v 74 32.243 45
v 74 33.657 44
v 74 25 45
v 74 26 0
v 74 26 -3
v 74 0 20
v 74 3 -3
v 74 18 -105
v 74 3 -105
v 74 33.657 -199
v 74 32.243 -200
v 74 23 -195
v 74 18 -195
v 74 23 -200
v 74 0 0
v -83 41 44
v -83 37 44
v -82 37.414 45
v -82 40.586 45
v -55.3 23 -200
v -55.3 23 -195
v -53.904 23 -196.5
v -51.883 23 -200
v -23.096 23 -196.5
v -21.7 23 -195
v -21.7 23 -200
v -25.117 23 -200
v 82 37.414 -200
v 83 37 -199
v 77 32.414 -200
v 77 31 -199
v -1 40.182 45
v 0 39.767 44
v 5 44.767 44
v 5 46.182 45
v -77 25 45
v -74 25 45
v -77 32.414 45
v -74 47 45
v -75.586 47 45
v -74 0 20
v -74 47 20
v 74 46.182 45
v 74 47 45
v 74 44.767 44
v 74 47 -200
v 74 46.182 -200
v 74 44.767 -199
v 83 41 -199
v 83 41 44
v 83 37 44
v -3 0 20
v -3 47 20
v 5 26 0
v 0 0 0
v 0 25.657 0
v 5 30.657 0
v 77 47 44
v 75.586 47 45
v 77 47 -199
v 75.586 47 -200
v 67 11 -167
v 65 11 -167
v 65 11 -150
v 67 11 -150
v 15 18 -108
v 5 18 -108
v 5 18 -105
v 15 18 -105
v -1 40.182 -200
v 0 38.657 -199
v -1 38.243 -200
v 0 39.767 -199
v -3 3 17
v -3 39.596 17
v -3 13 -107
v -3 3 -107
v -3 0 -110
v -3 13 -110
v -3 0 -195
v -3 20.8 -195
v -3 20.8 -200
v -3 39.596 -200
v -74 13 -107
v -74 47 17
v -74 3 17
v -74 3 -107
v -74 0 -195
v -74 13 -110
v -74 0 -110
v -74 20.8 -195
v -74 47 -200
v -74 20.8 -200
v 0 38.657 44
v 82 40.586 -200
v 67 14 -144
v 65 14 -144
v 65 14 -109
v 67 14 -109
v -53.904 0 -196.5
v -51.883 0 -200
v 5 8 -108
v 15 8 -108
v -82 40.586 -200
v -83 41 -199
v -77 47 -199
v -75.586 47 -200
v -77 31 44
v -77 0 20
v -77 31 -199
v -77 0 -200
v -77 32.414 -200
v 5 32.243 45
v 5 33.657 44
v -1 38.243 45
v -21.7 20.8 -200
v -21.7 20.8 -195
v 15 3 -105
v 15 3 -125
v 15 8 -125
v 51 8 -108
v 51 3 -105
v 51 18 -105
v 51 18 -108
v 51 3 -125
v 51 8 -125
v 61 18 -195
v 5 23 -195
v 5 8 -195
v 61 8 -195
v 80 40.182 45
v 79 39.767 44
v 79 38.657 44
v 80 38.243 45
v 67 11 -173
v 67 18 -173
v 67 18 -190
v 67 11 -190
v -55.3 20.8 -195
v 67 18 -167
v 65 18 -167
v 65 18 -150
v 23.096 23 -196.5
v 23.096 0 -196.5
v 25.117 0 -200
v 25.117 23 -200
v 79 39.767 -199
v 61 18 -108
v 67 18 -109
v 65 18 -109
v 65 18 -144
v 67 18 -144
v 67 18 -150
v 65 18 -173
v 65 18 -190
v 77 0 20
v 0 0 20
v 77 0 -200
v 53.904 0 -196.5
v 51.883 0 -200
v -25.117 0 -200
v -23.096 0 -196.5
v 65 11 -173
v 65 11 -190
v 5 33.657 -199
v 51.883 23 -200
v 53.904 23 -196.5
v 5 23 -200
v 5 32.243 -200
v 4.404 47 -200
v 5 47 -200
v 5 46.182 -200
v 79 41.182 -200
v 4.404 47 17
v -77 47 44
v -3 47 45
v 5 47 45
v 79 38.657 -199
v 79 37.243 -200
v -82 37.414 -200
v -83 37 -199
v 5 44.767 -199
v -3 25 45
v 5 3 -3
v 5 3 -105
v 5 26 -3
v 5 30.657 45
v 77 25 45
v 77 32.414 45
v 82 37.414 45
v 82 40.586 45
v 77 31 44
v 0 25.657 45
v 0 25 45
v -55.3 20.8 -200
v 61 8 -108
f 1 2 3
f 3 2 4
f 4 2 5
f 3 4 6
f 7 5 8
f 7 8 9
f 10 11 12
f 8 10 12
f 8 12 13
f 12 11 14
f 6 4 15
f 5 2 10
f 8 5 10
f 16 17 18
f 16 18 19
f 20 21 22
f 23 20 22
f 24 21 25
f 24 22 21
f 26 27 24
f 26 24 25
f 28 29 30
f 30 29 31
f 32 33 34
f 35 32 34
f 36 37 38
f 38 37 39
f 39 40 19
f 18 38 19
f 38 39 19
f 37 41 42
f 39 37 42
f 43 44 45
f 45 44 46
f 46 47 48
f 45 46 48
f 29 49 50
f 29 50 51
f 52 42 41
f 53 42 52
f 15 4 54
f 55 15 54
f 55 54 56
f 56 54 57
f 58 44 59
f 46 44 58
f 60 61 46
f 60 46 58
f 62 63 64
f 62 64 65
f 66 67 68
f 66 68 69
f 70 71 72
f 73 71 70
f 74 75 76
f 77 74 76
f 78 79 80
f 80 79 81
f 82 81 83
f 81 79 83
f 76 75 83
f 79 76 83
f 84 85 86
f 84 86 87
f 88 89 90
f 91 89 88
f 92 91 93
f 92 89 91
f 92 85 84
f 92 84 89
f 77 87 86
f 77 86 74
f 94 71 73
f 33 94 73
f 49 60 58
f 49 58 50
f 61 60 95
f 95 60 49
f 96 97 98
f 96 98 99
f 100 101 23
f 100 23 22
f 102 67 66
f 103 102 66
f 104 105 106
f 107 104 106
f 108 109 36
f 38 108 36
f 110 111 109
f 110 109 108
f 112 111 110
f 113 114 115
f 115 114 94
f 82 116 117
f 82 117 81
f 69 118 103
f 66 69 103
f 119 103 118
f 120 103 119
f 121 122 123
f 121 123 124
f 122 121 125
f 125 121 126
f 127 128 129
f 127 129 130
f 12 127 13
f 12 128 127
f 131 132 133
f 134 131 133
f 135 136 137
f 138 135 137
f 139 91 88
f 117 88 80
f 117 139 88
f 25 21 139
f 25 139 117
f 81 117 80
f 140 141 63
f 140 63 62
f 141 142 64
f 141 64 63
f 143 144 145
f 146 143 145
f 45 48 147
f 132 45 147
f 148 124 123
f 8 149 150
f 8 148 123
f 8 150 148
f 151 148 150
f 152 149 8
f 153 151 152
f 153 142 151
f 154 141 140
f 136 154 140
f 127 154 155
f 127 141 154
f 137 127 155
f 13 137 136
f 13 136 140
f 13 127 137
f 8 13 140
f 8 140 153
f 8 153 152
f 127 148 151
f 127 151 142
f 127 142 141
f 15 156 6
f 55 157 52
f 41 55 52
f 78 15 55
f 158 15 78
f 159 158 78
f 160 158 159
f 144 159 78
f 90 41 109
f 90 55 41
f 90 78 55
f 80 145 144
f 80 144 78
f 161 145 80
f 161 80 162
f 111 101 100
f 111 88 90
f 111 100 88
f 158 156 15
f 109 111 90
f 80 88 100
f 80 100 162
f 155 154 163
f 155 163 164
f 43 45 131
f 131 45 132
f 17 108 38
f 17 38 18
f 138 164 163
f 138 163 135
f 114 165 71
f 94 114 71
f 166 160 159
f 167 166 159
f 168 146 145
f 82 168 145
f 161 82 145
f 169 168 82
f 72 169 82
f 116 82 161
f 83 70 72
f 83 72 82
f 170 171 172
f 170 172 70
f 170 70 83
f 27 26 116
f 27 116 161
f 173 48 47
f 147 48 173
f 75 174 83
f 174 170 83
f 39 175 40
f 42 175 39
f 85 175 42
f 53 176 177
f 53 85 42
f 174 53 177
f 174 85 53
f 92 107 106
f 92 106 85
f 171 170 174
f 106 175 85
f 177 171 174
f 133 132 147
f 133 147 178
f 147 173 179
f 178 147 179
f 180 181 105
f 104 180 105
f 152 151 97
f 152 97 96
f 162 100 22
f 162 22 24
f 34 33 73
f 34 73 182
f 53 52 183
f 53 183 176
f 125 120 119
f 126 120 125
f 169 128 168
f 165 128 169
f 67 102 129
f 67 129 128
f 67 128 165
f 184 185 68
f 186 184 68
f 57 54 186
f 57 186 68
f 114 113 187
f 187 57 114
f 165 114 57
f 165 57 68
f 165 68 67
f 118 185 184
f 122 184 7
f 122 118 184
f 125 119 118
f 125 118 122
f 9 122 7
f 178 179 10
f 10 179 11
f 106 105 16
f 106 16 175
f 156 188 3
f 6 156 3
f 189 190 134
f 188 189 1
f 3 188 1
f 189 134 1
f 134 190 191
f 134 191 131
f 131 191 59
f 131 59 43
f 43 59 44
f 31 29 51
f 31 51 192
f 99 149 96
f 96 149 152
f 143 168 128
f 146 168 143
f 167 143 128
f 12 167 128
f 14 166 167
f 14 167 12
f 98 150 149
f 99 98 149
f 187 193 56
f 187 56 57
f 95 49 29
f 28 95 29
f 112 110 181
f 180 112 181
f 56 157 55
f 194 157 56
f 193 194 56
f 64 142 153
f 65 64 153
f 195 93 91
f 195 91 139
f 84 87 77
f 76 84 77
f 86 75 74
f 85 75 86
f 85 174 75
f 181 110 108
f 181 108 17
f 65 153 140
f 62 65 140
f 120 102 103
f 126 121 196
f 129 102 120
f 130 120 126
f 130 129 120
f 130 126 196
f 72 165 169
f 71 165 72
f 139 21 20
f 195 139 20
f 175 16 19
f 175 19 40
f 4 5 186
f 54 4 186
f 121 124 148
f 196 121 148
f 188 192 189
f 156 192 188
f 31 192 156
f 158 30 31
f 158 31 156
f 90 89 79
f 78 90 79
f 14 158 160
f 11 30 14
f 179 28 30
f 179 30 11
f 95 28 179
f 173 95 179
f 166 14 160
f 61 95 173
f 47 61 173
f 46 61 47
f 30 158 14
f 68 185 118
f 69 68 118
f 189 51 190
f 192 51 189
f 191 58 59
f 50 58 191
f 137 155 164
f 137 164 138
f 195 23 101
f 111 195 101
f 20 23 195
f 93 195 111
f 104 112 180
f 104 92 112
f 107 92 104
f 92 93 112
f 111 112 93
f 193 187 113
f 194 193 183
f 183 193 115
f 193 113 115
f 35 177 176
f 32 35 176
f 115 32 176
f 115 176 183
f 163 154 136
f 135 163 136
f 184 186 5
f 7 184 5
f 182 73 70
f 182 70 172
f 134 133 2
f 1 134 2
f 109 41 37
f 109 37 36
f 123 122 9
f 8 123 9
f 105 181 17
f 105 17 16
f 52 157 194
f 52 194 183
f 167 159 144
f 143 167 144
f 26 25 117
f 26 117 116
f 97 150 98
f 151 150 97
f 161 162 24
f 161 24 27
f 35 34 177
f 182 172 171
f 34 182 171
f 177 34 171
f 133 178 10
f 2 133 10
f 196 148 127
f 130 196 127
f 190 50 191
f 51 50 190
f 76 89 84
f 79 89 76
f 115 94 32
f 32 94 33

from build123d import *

# Parameters (mm, degrees)
EXTRUDE_1_DEPTH       = 200
SKETCH_3_W            = 148
SKETCH_3_H            = 194
CUT_EXTRUDE_1_DEPTH   = 44
SKETCH_4_W            = 8
SKETCH_4_H            = 194
EXTRUDE_1_2_DEPTH     = 44
CUT_EXTRUDE_2_DEPTH   = 222.580685079
CUT_EXTRUDE_5_DEPTH   = 219.876677606
MOVE_FACE_1_BY        = 2
MOVE_FACE_1_2_BY      = 2
CUT_EXTRUDE_6_DEPTH   = 222.580685079
CUT_EXTRUDE_7_DEPTH   = 16.595837
MOVE_FACE_2_BY        = 45
MOVE_FACE_3_BY        = 20
SKETCH_13_W           = 71
SKETCH_13_H           = 47
CUT_EXTRUDE_8_DEPTH   = 25
SKETCH_14_W           = 69
SKETCH_14_H           = 26
CUT_EXTRUDE_9_DEPTH   = 45
CUT_EXTRUDE_10_DEPTH  = 45
CHAMFER_1_SIZE        = 25
CUT_EXTRUDE_11_REACH  = 222.964
SKETCH_16_W           = 71
SKETCH_16_H           = 85
SKETCH_17_W           = 71
SKETCH_17_H           = 3
EXTRUDE_2_DEPTH       = 10
SKETCH_18_W           = 18.7
SKETCH_18_H           = 5
CUT_EXTRUDE_12_DEPTH  = 2.2
SKETCH_19_W           = 69
SKETCH_19_H           = 90
EXTRUDE_3_DEPTH       = 15
SKETCH_20_W           = 56
SKETCH_20_H           = 87
CUT_EXTRUDE_13_DEPTH  = 10
CUT_EXTRUDE_14_REACH  = 220.472
SKETCH_21_W           = 36
SKETCH_21_H           = 34
SKETCH_22_W           = 2
SKETCH_22_H           = 17
SKETCH_22_H_2         = 35
CUT_EXTRUDE_1_2_DEPTH = 7
MOVE_FACE_4_BY        = 3
CHAMFER_2_SIZE        = 1


with BuildPart() as part:
    # 草图1 → Extrude 1 (new body)
    with BuildSketch(Plane.XY):
        Polygon((77, 0), (-77, 0), (-77, 31), (-83, 37), (-83, 41), (-77, 47), (77, 47), (83, 41), (83, 37), (77, 31), align=None)
    extrude(amount=-EXTRUDE_1_DEPTH)

    # 草图3 → Cut-Extrude 1 (cut)
    with BuildSketch(Plane(origin=(0, 47, 0), x_dir=(1, 0, 0), z_dir=(0, 1, 0))):
        with Locations((0, 100)):
            Rectangle(SKETCH_3_W, SKETCH_3_H)
    extrude(amount=-CUT_EXTRUDE_1_DEPTH, mode=Mode.SUBTRACT)

    # 草图4 → Extrude 1 2 (add)
    with BuildSketch(Plane(origin=(0, 3, 0), x_dir=(1, 0, 0), z_dir=(0, 1, 0))):
        with Locations((1, 100)):
            Rectangle(SKETCH_4_W, SKETCH_4_H)
    extrude(amount=EXTRUDE_1_2_DEPTH)

    # 草图5 → 切除-拉伸2 (cut, through all)
    with BuildSketch(Plane(origin=(0, 0, -200), x_dir=(-1, 0, 0), z_dir=(0, 0, -1))):
        Polygon((-74, 47), (-74, 44.767409819), (-79, 39.767409819), (-79, 38.656854249), (-74, 33.656854249), (-74, 26), (-5, 26), (-5, 33.656854249), (0, 38.656854249), (0, 39.767409819), (-5, 44.767409819), (-5, 47), align=None)
    extrude(amount=-CUT_EXTRUDE_2_DEPTH, mode=Mode.SUBTRACT)

    # 草图9 → 切除-拉伸5 (cut, through all)
    with BuildSketch(Plane(origin=(0, 0, -3), x_dir=(-1, 0, 0), z_dir=(0, 0, -1))):
        Polygon((-4.404163056, 47), (3, 39.595836944), (74, 39.595836944), (74, 47), (3, 47), align=None)
    extrude(amount=CUT_EXTRUDE_5_DEPTH, mode=Mode.SUBTRACT)

    # Move Face 1: a face moved outward by 2.0
    extrude(part.faces().sort_by_distance((39.5, 14.5, -197))[0], amount=MOVE_FACE_1_BY, dir=(0, 0, 1))

    # Move Face 1 2: a face moved outward by 2.0
    extrude(part.faces().sort_by_distance((-38.5, 21.297918472, -197))[0], amount=MOVE_FACE_1_2_BY, dir=(0, 0, 1))

    # 草图11 → 切除-拉伸6 (cut, through all)
    with BuildSketch(Plane.XZ):
        Polygon((51.883419246, -200), (53.904145188, -196.5), (23.095854812, -196.5), (25.116580754, -200), align=None)
        Polygon((-53.904145188, -196.5), (-23.095854812, -196.5), (-25.116580754, -200), (-51.883419246, -200), align=None)
    extrude(amount=-CUT_EXTRUDE_6_DEPTH, mode=Mode.SUBTRACT)

    # 草图12 → 切除-拉伸7 (cut)
    with BuildSketch(Plane(origin=(0, 39.595836944, 0), x_dir=(1, 0, 0), z_dir=(0, 1, 0))):
        Polygon((-53.904145188, 196.5), (-51.883419246, 200), (-74, 200), (-74, 195), (-3, 195), (-3, 200), (-25.116580754, 200), (-23.095854812, 196.5), align=None)
        Polygon((53.904145188, 196.5), (23.095854812, 196.5), (25.116580754, 200), (5, 200), (5, 195), (74, 195), (74, 200), (51.883419246, 200), align=None)
    extrude(amount=-CUT_EXTRUDE_7_DEPTH, mode=Mode.SUBTRACT)

    # Move Face 2: a face moved outward by 45.0
    extrude(part.faces().sort_by_distance((-10.200110487, 20.43272532, 0))[0], amount=MOVE_FACE_2_BY, dir=(0, 0, 1))

    # Move Face 3: a face moved inward by 20.0
    extrude(part.faces().sort_by_distance((-38.169755743, 25.169887896, -3))[0], amount=MOVE_FACE_3_BY, dir=(0, 0, 1), mode=Mode.SUBTRACT)

    # 草图13 → 切除-拉伸8 (cut)
    with BuildSketch(Plane.XY.offset(45)):
        with Locations((-38.5, 23.5)):
            Rectangle(SKETCH_13_W, SKETCH_13_H)
    extrude(amount=-CUT_EXTRUDE_8_DEPTH, mode=Mode.SUBTRACT)

    # 草图14 → 切除-拉伸9 (cut)
    with BuildSketch(Plane.XY.offset(45)):
        with Locations((39.5, 13)):
            Rectangle(SKETCH_14_W, SKETCH_14_H)
    extrude(amount=-CUT_EXTRUDE_9_DEPTH, mode=Mode.SUBTRACT)

    # 草图15 → 切除-拉伸10 (cut)
    with BuildSketch(Plane.XY.offset(45)):
        Polygon((5, 0), (0, 0), (0, 25.656854249), (5, 30.656854249), align=None)
    extrude(amount=-CUT_EXTRUDE_10_DEPTH, mode=Mode.SUBTRACT)

    # 倒角1
    chamfer_1_edges = [part.edges().sort_by_distance(p)[0] for p in [
        (75.5, 0, 45),
        (-1.5, 0, 45),
        (-75.5, 0, 45),
    ]]
    chamfer(chamfer_1_edges, length=CHAMFER_1_SIZE)

    # 草图16 → 切除-拉伸11 (cut, up to next)
    with BuildSketch(Plane(origin=(0, 3, 0), x_dir=(1, 0, 0), z_dir=(0, 1, 0)), mode=Mode.PRIVATE) as cut_extrude_11_sk1:
        with Locations((-38.5, 152.5)):
            Rectangle(SKETCH_16_W, SKETCH_16_H)
    cut_extrude_11_tool1 = extrude(cut_extrude_11_sk1.sketch, amount=-CUT_EXTRUDE_11_REACH, mode=Mode.PRIVATE) & part.part
    add(cut_extrude_11_tool1.solids().sort_by_distance((-38.5, 3, -152.5))[0], mode=Mode.SUBTRACT)

    # 草图17 → 凸台-拉伸2 (add)
    with BuildSketch(Plane(origin=(0, 3, 0), x_dir=(1, 0, 0), z_dir=(0, 1, 0))):
        with Locations((-38.5, 108.5)):
            Rectangle(SKETCH_17_W, SKETCH_17_H)
    extrude(amount=EXTRUDE_2_DEPTH)

    # 草图18 → 切除-拉伸12 (cut)
    with BuildSketch(Plane(origin=(0, 23, 0), x_dir=(1, 0, 0), z_dir=(0, 1, 0))):
        with Locations((-12.35, 197.5)):
            Rectangle(SKETCH_18_W, SKETCH_18_H)
        with Locations((-64.65, 197.5)):
            Rectangle(SKETCH_18_W, SKETCH_18_H)
    extrude(amount=-CUT_EXTRUDE_12_DEPTH, mode=Mode.SUBTRACT)

    # 草图19 → 凸台-拉伸3 (add)
    with BuildSketch(Plane(origin=(0, 3, 0), x_dir=(1, 0, 0), z_dir=(0, 1, 0))):
        with Locations((39.5, 150)):
            Rectangle(SKETCH_19_W, SKETCH_19_H)
    extrude(amount=EXTRUDE_3_DEPTH)

    # 草图20 → 切除-拉伸13 (cut)
    with BuildSketch(Plane(origin=(0, 18, 0), x_dir=(1, 0, 0), z_dir=(0, 1, 0))):
        with Locations((33, 151.5)):
            Rectangle(SKETCH_20_W, SKETCH_20_H)
    extrude(amount=-CUT_EXTRUDE_13_DEPTH, mode=Mode.SUBTRACT)

    # 切除-拉伸14: up to this face of the body (flat: up to its plane)
    cut_extrude_14_end = Plane(part.part.faces().sort_by_distance((39.5, 3, -54))[0])
    # 草图21 → 切除-拉伸14 (cut, up to the picked face)
    with BuildSketch(Plane(origin=(0, 18, 0), x_dir=(1, 0, 0), z_dir=(0, 1, 0)), mode=Mode.PRIVATE) as cut_extrude_14_sk1:
        with Locations((33, 108)):
            Rectangle(SKETCH_21_W, SKETCH_21_H)
    cut_extrude_14_tool1 = split(extrude(cut_extrude_14_sk1.sketch, amount=-CUT_EXTRUDE_14_REACH, mode=Mode.PRIVATE), bisect_by=cut_extrude_14_end, keep=Keep.BOTH, mode=Mode.PRIVATE)
    add(cut_extrude_14_tool1.solids().sort_by(Axis((33, 18, -108), (0, -1, 0)))[0], mode=Mode.SUBTRACT)

    # 草图22 → Cut-Extrude 1 2 (cut)
    with BuildSketch(Plane(origin=(0, 18, 0), x_dir=(1, 0, 0), z_dir=(0, 1, 0))):
        with Locations((66, 181.5)):
            Rectangle(SKETCH_22_W, SKETCH_22_H)
        with Locations((66, 158.5)):
            Rectangle(SKETCH_22_W, SKETCH_22_H)
        with Locations((66, 126.5)):
            Rectangle(SKETCH_22_W, SKETCH_22_H_2)
    extrude(amount=-CUT_EXTRUDE_1_2_DEPTH, mode=Mode.SUBTRACT)

    # Move Face 4: a face moved outward by 3.0
    extrude(part.faces().sort_by_distance((66, 11, -126.5))[0], amount=MOVE_FACE_4_BY, dir=(0, 1, 0))

    # 倒角2
    chamfer_2_edges = [part.edges().sort_by_distance(p)[0] for p in [
        (-80, 34, 45),
        (-83, 39, 45),
        (-80, 44, 45),
        (80, 44, 45),
        (83, 39, 45),
        (80, 34, 45),
        (80, 34, -200),
        (83, 39, -200),
        (80, 44, -200),
        (-80, 44, -200),
        (-83, 39, -200),
        (-80, 34, -200),
        (2.5, 42.267409819, 45),
        (0, 39.212132034, 45),
        (2.5, 36.156854249, 45),
        (76.5, 36.156854249, 45),
        (79, 39.212132034, 45),
        (76.5, 42.267409819, 45),
        (76.5, 42.267409819, -200),
        (76.5, 36.156854249, -200),
        (2.5, 36.156854249, -200),
        (0, 39.212132034, -200),
        (2.5, 42.267409819, -200),
    ]]
    chamfer(chamfer_2_edges, length=CHAMFER_2_SIZE)


solid = part.part
